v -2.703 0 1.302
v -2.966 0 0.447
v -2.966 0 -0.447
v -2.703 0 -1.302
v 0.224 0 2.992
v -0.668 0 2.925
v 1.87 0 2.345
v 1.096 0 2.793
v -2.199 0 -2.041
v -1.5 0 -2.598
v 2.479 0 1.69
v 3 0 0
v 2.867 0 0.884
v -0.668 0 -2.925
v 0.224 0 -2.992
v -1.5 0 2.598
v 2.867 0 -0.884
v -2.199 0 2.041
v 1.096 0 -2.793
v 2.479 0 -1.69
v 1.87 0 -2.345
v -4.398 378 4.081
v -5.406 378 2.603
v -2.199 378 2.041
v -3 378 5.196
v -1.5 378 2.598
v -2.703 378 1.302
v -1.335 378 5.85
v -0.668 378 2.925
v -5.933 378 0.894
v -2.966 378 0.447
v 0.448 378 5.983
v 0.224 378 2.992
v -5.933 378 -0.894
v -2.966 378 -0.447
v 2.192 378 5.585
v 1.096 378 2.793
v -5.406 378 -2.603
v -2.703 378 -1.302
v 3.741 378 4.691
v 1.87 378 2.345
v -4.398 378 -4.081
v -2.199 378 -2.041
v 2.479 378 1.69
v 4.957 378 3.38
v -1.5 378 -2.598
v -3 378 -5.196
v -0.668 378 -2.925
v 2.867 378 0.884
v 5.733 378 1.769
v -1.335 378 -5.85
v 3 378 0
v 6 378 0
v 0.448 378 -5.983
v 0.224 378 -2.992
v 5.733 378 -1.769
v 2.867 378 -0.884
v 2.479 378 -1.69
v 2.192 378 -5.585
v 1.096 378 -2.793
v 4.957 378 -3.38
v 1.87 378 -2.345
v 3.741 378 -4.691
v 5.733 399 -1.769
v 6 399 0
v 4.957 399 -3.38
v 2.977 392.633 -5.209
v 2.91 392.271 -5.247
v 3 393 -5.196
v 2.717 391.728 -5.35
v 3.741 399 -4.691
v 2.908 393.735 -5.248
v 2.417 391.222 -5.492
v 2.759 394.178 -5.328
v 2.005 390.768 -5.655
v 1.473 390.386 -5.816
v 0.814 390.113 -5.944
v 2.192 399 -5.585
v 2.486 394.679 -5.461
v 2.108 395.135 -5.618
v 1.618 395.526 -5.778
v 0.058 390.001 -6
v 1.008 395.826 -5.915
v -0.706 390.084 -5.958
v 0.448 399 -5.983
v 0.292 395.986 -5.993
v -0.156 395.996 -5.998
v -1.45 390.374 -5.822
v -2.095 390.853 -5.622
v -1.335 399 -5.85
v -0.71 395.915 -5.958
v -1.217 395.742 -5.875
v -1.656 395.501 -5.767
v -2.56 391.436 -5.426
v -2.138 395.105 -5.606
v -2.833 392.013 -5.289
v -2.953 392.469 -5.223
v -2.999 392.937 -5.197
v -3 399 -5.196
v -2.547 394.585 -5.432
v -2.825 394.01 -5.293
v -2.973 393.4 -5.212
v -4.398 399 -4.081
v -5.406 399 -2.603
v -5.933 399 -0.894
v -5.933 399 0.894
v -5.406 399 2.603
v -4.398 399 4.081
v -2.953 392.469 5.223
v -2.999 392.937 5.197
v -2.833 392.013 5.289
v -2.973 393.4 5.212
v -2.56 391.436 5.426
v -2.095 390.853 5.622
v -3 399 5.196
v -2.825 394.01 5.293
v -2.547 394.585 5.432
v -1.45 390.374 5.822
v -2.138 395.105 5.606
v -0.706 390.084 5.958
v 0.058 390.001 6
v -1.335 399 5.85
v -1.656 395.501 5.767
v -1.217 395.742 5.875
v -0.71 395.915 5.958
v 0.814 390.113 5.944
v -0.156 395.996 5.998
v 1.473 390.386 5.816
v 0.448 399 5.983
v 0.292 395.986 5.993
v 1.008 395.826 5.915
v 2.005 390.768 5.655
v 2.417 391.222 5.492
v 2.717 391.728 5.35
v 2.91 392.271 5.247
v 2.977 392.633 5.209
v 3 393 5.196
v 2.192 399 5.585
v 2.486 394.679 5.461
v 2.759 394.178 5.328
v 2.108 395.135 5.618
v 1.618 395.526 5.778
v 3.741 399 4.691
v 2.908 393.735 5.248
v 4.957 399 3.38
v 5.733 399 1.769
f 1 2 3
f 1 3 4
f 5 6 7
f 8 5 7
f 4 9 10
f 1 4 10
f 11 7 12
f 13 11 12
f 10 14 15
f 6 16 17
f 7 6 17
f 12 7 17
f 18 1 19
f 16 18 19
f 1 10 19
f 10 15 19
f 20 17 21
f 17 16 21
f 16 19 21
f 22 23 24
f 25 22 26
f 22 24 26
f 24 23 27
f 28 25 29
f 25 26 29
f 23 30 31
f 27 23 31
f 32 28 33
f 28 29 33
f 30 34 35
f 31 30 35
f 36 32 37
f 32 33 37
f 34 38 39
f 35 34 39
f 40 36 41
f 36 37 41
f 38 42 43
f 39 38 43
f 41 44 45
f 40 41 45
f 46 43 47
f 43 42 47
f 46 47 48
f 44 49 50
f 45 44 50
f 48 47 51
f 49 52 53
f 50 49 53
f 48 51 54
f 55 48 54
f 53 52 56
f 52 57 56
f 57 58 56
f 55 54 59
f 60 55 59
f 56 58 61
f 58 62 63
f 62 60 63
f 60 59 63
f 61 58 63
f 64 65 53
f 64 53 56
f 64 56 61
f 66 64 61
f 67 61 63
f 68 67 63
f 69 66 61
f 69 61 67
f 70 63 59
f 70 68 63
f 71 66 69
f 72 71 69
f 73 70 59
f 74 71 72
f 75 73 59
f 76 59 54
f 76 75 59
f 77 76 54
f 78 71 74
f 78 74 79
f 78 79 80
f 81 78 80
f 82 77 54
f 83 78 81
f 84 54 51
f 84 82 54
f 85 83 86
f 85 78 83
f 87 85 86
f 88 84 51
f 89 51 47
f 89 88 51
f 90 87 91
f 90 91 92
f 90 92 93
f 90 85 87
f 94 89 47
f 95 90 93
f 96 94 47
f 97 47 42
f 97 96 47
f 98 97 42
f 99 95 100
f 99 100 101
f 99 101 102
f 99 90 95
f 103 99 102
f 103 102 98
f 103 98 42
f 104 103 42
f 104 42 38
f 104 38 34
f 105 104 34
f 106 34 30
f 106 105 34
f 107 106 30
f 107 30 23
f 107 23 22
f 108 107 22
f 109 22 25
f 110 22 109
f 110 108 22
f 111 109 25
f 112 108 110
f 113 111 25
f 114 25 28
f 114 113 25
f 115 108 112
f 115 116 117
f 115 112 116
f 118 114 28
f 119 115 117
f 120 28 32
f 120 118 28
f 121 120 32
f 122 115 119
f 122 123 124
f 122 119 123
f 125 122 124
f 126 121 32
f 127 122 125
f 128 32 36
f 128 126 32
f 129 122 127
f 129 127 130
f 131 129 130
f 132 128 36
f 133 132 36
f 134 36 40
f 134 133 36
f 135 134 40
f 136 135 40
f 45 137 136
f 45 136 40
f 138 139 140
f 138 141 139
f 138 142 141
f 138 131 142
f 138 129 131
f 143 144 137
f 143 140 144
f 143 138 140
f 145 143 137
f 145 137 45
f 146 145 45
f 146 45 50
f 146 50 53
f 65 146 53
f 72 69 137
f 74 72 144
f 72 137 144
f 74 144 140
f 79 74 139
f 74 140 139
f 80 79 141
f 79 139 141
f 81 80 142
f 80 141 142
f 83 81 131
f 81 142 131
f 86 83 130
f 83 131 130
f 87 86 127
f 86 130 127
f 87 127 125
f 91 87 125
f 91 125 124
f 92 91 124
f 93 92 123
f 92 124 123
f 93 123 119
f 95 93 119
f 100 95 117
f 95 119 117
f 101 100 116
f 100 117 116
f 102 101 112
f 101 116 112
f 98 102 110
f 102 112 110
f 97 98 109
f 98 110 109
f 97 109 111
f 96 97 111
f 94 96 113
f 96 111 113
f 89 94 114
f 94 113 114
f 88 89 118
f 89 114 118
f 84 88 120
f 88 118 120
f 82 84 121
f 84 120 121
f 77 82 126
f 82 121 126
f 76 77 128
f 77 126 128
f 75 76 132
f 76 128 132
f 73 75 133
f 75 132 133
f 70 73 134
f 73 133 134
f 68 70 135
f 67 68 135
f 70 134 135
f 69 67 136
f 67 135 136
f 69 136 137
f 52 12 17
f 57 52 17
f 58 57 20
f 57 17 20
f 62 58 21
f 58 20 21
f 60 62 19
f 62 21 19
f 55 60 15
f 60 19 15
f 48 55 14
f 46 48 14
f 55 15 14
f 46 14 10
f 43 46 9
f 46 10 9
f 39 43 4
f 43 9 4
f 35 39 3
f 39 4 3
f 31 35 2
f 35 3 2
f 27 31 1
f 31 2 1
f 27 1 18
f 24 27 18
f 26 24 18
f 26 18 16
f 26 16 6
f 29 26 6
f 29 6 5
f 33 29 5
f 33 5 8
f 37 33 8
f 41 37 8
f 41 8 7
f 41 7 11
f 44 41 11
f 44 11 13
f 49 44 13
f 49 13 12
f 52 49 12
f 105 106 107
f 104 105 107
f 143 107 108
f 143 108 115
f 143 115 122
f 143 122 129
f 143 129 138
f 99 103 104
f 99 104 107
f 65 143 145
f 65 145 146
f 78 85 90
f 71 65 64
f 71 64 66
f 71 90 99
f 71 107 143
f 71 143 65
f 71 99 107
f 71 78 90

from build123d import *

# Parameters (mm, degrees)
CROQUIS1_R                   = 3
SALIENTE_EXTRUIR1_DEPTH      = 390
CROQUIS2_R                   = 6
CROQUIS2_R_2                 = 3
SALIENTE_EXTRUIR5_DEPTH      = 9
SALIENTE_EXTRUIR5_DEPTH_BACK = 12
CROQUIS8_R                   = 3
SALIENTE_EXTRUIR6_DEPTH      = 9
CROQUIS9_R                   = 3
CORTAR_EXTRUIR1_DEPTH        = 10


with BuildPart() as part:
    # Croquis1 → Saliente-Extruir1 (new body)
    with BuildSketch(Plane(origin=(0, 0, 0), x_dir=(1, 0, 0), z_dir=(0, 1, 0))):
        Circle(CROQUIS1_R)
    extrude(amount=SALIENTE_EXTRUIR1_DEPTH)

    # Croquis2 → Saliente-Extruir5 (add, two sides)
    with BuildSketch(Plane(origin=(0, 390, 0), x_dir=(1, 0, 0), z_dir=(0, 1, 0))) as saliente_extruir5_sk:
        Circle(CROQUIS2_R)
        Circle(CROQUIS2_R_2, mode=Mode.SUBTRACT)
    extrude(amount=SALIENTE_EXTRUIR5_DEPTH)
    extrude(saliente_extruir5_sk.sketch, amount=-SALIENTE_EXTRUIR5_DEPTH_BACK)

    # Croquis8 → Saliente-Extruir6 (add)
    with BuildSketch(Plane(origin=(0, 390, 0), x_dir=(1, 0, 0), z_dir=(0, 1, 0))):
        Circle(CROQUIS8_R)
    extrude(amount=SALIENTE_EXTRUIR6_DEPTH)

    # Croquis9 → Cortar-Extruir1 (cut, symmetric)
    with BuildSketch(Plane.XY):
        with Locations((0, 393)):
            Circle(CROQUIS9_R)
    extrude(amount=CORTAR_EXTRUIR1_DEPTH, both=True, mode=Mode.SUBTRACT)


solid = part.part
